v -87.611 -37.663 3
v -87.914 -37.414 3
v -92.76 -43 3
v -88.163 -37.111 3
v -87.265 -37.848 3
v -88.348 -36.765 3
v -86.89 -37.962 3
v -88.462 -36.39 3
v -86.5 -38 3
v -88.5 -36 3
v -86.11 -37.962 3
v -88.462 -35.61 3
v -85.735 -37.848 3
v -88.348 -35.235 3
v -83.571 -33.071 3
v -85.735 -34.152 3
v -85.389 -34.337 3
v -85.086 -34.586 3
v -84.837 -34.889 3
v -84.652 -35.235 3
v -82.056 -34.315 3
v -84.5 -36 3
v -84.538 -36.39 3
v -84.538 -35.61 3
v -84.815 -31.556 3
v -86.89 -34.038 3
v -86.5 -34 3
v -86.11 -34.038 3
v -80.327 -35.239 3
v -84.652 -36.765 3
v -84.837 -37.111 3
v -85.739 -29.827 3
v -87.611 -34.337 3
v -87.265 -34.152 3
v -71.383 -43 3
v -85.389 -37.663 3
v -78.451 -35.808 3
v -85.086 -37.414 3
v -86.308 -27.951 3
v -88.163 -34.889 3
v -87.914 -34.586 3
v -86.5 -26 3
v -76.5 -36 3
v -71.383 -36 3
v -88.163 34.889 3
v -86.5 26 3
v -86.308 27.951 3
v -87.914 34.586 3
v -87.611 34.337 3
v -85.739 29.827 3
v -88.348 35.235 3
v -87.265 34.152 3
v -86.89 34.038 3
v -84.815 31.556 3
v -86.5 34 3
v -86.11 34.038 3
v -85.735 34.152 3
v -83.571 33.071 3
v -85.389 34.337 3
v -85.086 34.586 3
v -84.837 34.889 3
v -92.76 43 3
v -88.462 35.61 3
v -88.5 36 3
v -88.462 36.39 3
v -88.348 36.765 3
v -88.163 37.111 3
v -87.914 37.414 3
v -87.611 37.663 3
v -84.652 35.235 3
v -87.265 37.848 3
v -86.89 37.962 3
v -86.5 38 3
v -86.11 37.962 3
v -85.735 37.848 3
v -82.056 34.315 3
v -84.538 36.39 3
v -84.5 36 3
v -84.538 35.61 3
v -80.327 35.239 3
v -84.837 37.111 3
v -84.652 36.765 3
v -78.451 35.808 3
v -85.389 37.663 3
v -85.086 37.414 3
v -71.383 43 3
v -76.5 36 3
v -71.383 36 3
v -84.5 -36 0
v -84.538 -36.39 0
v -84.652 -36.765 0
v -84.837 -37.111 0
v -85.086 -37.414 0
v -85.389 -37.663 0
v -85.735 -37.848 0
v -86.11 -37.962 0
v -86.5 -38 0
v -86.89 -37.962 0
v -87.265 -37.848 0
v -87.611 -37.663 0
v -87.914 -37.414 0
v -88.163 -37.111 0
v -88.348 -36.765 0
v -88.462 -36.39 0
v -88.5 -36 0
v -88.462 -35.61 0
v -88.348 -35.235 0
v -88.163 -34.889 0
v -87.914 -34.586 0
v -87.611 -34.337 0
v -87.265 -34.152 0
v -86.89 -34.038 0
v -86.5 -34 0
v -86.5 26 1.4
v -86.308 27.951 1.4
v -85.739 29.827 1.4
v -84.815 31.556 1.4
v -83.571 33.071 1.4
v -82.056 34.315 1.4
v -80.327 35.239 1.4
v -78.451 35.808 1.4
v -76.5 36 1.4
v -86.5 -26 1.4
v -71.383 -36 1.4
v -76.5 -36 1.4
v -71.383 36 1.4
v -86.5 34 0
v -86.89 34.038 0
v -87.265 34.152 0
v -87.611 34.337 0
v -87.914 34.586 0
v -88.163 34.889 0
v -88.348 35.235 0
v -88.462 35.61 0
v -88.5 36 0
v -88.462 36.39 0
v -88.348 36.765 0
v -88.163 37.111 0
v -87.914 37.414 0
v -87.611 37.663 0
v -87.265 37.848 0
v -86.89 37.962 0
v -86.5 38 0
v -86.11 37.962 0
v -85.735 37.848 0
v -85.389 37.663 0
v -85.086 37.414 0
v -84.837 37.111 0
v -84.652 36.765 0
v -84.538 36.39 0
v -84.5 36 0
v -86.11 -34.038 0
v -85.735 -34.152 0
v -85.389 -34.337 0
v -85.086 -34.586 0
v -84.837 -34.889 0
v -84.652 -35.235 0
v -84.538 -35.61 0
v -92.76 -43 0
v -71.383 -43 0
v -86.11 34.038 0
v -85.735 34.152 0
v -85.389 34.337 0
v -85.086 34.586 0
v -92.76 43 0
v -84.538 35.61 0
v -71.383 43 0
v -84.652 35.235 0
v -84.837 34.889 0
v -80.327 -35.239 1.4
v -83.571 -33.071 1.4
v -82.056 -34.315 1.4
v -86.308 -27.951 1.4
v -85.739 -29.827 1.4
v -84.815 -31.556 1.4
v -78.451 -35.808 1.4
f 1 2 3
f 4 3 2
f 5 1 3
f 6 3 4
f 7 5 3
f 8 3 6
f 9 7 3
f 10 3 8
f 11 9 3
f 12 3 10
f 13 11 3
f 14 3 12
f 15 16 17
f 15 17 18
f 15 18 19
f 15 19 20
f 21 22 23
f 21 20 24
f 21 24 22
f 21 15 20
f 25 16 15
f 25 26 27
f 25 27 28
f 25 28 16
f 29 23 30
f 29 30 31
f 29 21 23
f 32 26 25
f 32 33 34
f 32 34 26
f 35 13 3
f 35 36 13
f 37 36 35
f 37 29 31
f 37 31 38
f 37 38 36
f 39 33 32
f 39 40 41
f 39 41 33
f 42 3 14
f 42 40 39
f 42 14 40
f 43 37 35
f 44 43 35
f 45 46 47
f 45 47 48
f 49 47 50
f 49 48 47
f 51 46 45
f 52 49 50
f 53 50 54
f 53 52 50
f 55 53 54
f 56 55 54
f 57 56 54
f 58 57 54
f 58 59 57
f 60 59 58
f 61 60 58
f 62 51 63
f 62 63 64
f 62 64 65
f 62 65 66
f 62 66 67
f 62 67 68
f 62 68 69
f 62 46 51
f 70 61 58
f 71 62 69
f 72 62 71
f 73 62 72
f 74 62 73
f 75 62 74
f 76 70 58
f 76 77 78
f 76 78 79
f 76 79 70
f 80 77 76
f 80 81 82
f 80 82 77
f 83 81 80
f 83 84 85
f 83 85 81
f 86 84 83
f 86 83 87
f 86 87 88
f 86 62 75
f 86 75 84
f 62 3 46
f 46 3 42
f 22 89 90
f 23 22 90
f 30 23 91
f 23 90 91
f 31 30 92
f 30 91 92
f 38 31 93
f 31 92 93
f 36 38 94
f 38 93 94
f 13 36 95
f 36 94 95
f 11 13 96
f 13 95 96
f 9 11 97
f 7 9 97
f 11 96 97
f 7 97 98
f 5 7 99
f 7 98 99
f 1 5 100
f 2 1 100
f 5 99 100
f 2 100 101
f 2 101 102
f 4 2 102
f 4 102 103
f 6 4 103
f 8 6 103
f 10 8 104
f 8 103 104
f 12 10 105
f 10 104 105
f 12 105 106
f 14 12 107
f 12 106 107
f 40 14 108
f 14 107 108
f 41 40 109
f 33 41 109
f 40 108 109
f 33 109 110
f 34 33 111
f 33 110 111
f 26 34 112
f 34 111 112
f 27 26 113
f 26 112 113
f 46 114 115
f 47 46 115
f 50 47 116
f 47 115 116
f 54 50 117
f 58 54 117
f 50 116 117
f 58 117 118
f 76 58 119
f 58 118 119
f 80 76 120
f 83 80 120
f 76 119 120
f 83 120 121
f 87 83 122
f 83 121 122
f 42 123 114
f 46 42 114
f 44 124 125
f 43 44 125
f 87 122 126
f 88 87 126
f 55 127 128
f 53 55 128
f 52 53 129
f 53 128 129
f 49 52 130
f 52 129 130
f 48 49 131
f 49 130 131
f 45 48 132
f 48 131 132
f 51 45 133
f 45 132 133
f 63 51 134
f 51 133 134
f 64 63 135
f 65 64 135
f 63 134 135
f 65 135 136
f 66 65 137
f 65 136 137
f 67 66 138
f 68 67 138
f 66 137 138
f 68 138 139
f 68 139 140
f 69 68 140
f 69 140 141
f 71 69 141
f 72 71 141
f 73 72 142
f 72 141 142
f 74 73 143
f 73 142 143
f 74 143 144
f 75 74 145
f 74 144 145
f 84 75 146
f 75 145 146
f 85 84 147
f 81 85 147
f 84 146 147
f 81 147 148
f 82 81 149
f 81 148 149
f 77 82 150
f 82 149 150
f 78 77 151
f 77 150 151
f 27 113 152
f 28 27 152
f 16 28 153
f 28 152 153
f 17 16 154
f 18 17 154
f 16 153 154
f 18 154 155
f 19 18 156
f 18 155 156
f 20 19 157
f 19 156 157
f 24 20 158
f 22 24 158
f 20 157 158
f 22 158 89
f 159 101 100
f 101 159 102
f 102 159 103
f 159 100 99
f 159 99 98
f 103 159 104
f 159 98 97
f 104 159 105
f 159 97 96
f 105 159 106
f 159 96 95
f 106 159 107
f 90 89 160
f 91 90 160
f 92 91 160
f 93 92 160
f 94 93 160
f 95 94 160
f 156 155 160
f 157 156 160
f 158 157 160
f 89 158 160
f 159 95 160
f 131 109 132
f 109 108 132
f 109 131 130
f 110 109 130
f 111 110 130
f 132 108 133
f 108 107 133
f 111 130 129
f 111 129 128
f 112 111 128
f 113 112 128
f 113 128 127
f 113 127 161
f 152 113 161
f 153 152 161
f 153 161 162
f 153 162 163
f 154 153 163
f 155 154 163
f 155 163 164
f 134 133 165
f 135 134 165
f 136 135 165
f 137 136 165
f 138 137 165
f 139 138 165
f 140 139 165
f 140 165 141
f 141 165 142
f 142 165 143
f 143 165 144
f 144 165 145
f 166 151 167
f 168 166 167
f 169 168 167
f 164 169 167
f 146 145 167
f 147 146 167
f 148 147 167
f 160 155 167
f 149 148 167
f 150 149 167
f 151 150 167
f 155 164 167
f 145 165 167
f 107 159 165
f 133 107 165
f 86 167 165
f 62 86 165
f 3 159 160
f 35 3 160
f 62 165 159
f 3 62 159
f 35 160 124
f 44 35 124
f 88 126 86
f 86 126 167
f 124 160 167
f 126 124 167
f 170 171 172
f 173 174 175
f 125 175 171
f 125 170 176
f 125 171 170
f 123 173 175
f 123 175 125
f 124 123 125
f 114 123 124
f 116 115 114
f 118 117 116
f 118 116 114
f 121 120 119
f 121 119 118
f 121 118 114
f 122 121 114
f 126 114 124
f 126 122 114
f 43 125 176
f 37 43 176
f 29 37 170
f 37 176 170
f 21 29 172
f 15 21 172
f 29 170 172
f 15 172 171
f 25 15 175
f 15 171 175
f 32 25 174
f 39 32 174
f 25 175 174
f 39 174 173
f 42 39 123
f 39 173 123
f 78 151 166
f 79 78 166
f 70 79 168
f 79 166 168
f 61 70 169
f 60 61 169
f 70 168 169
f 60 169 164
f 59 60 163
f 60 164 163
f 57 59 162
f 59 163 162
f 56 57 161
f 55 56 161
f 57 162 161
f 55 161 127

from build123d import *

# Parameters (mm, degrees)
F1_DEPTH = 3
F2_DEPTH = 1.4


with BuildPart() as f1:
    # F0 (on Top) → F1 (new body)
    with BuildSketch(Plane.XY):
        with BuildLine():
            Line((-76.5, 36), (-71.383327, 36))
            Line((-71.383327, 36), (-71.383327, 43))
            Line((-71.383327, 43), (-92.759609, 43))
            Line((-92.759609, 43), (-92.759609, -43))
            Line((-92.759609, -43), (-71.383327, -43))
            Line((-71.383327, -43), (-71.383327, -36))
            Line((-71.383327, -36), (-76.5, -36))
            Line((-76.5, -36), (-84.5, -36))
            ThreePointArc((-84.5, -36), (-87.914214, -37.414214), (-86.5, -34))
            Line((-86.5, -34), (-86.5, -26))
            Line((-86.5, -26), (-86.5, 26))
            Line((-86.5, 26), (-86.5, 34))
            ThreePointArc((-86.5, 34), (-87.914214, 37.414214), (-84.5, 36))
            Line((-84.5, 36), (-76.5, 36))
        make_face()
        with BuildLine():
            ThreePointArc((-86.5, 26), (-83.571068, 33.071068), (-76.5, 36))
            Line((-76.5, 36), (-84.5, 36))
            ThreePointArc((-84.5, 36), (-85.085786, 34.585786), (-86.5, 34))
            Line((-86.5, 34), (-86.5, 26))
        make_face()
        with BuildLine():
            Line((-84.5, -36), (-76.5, -36))
            ThreePointArc((-76.5, -36), (-83.571068, -33.071068), (-86.5, -26))
            Line((-86.5, -26), (-86.5, -34))
            ThreePointArc((-86.5, -34), (-85.085786, -34.585786), (-84.5, -36))
        make_face()
    extrude(amount=F1_DEPTH)

    # F0 (on Top) → F2 (join)
    with BuildSketch(Plane.XY):
        with BuildLine():
            Line((-71.383327, -36), (-71.383327, 36))
            Line((-71.383327, 36), (-76.5, 36))
            ThreePointArc((-76.5, 36), (-83.571068, 33.071068), (-86.5, 26))
            Line((-86.5, 26), (-86.5, -26))
            ThreePointArc((-86.5, -26), (-83.571068, -33.071068), (-76.5, -36))
            Line((-76.5, -36), (-71.383327, -36))
        make_face()
    extrude(amount=F2_DEPTH)


solid = f1.part
